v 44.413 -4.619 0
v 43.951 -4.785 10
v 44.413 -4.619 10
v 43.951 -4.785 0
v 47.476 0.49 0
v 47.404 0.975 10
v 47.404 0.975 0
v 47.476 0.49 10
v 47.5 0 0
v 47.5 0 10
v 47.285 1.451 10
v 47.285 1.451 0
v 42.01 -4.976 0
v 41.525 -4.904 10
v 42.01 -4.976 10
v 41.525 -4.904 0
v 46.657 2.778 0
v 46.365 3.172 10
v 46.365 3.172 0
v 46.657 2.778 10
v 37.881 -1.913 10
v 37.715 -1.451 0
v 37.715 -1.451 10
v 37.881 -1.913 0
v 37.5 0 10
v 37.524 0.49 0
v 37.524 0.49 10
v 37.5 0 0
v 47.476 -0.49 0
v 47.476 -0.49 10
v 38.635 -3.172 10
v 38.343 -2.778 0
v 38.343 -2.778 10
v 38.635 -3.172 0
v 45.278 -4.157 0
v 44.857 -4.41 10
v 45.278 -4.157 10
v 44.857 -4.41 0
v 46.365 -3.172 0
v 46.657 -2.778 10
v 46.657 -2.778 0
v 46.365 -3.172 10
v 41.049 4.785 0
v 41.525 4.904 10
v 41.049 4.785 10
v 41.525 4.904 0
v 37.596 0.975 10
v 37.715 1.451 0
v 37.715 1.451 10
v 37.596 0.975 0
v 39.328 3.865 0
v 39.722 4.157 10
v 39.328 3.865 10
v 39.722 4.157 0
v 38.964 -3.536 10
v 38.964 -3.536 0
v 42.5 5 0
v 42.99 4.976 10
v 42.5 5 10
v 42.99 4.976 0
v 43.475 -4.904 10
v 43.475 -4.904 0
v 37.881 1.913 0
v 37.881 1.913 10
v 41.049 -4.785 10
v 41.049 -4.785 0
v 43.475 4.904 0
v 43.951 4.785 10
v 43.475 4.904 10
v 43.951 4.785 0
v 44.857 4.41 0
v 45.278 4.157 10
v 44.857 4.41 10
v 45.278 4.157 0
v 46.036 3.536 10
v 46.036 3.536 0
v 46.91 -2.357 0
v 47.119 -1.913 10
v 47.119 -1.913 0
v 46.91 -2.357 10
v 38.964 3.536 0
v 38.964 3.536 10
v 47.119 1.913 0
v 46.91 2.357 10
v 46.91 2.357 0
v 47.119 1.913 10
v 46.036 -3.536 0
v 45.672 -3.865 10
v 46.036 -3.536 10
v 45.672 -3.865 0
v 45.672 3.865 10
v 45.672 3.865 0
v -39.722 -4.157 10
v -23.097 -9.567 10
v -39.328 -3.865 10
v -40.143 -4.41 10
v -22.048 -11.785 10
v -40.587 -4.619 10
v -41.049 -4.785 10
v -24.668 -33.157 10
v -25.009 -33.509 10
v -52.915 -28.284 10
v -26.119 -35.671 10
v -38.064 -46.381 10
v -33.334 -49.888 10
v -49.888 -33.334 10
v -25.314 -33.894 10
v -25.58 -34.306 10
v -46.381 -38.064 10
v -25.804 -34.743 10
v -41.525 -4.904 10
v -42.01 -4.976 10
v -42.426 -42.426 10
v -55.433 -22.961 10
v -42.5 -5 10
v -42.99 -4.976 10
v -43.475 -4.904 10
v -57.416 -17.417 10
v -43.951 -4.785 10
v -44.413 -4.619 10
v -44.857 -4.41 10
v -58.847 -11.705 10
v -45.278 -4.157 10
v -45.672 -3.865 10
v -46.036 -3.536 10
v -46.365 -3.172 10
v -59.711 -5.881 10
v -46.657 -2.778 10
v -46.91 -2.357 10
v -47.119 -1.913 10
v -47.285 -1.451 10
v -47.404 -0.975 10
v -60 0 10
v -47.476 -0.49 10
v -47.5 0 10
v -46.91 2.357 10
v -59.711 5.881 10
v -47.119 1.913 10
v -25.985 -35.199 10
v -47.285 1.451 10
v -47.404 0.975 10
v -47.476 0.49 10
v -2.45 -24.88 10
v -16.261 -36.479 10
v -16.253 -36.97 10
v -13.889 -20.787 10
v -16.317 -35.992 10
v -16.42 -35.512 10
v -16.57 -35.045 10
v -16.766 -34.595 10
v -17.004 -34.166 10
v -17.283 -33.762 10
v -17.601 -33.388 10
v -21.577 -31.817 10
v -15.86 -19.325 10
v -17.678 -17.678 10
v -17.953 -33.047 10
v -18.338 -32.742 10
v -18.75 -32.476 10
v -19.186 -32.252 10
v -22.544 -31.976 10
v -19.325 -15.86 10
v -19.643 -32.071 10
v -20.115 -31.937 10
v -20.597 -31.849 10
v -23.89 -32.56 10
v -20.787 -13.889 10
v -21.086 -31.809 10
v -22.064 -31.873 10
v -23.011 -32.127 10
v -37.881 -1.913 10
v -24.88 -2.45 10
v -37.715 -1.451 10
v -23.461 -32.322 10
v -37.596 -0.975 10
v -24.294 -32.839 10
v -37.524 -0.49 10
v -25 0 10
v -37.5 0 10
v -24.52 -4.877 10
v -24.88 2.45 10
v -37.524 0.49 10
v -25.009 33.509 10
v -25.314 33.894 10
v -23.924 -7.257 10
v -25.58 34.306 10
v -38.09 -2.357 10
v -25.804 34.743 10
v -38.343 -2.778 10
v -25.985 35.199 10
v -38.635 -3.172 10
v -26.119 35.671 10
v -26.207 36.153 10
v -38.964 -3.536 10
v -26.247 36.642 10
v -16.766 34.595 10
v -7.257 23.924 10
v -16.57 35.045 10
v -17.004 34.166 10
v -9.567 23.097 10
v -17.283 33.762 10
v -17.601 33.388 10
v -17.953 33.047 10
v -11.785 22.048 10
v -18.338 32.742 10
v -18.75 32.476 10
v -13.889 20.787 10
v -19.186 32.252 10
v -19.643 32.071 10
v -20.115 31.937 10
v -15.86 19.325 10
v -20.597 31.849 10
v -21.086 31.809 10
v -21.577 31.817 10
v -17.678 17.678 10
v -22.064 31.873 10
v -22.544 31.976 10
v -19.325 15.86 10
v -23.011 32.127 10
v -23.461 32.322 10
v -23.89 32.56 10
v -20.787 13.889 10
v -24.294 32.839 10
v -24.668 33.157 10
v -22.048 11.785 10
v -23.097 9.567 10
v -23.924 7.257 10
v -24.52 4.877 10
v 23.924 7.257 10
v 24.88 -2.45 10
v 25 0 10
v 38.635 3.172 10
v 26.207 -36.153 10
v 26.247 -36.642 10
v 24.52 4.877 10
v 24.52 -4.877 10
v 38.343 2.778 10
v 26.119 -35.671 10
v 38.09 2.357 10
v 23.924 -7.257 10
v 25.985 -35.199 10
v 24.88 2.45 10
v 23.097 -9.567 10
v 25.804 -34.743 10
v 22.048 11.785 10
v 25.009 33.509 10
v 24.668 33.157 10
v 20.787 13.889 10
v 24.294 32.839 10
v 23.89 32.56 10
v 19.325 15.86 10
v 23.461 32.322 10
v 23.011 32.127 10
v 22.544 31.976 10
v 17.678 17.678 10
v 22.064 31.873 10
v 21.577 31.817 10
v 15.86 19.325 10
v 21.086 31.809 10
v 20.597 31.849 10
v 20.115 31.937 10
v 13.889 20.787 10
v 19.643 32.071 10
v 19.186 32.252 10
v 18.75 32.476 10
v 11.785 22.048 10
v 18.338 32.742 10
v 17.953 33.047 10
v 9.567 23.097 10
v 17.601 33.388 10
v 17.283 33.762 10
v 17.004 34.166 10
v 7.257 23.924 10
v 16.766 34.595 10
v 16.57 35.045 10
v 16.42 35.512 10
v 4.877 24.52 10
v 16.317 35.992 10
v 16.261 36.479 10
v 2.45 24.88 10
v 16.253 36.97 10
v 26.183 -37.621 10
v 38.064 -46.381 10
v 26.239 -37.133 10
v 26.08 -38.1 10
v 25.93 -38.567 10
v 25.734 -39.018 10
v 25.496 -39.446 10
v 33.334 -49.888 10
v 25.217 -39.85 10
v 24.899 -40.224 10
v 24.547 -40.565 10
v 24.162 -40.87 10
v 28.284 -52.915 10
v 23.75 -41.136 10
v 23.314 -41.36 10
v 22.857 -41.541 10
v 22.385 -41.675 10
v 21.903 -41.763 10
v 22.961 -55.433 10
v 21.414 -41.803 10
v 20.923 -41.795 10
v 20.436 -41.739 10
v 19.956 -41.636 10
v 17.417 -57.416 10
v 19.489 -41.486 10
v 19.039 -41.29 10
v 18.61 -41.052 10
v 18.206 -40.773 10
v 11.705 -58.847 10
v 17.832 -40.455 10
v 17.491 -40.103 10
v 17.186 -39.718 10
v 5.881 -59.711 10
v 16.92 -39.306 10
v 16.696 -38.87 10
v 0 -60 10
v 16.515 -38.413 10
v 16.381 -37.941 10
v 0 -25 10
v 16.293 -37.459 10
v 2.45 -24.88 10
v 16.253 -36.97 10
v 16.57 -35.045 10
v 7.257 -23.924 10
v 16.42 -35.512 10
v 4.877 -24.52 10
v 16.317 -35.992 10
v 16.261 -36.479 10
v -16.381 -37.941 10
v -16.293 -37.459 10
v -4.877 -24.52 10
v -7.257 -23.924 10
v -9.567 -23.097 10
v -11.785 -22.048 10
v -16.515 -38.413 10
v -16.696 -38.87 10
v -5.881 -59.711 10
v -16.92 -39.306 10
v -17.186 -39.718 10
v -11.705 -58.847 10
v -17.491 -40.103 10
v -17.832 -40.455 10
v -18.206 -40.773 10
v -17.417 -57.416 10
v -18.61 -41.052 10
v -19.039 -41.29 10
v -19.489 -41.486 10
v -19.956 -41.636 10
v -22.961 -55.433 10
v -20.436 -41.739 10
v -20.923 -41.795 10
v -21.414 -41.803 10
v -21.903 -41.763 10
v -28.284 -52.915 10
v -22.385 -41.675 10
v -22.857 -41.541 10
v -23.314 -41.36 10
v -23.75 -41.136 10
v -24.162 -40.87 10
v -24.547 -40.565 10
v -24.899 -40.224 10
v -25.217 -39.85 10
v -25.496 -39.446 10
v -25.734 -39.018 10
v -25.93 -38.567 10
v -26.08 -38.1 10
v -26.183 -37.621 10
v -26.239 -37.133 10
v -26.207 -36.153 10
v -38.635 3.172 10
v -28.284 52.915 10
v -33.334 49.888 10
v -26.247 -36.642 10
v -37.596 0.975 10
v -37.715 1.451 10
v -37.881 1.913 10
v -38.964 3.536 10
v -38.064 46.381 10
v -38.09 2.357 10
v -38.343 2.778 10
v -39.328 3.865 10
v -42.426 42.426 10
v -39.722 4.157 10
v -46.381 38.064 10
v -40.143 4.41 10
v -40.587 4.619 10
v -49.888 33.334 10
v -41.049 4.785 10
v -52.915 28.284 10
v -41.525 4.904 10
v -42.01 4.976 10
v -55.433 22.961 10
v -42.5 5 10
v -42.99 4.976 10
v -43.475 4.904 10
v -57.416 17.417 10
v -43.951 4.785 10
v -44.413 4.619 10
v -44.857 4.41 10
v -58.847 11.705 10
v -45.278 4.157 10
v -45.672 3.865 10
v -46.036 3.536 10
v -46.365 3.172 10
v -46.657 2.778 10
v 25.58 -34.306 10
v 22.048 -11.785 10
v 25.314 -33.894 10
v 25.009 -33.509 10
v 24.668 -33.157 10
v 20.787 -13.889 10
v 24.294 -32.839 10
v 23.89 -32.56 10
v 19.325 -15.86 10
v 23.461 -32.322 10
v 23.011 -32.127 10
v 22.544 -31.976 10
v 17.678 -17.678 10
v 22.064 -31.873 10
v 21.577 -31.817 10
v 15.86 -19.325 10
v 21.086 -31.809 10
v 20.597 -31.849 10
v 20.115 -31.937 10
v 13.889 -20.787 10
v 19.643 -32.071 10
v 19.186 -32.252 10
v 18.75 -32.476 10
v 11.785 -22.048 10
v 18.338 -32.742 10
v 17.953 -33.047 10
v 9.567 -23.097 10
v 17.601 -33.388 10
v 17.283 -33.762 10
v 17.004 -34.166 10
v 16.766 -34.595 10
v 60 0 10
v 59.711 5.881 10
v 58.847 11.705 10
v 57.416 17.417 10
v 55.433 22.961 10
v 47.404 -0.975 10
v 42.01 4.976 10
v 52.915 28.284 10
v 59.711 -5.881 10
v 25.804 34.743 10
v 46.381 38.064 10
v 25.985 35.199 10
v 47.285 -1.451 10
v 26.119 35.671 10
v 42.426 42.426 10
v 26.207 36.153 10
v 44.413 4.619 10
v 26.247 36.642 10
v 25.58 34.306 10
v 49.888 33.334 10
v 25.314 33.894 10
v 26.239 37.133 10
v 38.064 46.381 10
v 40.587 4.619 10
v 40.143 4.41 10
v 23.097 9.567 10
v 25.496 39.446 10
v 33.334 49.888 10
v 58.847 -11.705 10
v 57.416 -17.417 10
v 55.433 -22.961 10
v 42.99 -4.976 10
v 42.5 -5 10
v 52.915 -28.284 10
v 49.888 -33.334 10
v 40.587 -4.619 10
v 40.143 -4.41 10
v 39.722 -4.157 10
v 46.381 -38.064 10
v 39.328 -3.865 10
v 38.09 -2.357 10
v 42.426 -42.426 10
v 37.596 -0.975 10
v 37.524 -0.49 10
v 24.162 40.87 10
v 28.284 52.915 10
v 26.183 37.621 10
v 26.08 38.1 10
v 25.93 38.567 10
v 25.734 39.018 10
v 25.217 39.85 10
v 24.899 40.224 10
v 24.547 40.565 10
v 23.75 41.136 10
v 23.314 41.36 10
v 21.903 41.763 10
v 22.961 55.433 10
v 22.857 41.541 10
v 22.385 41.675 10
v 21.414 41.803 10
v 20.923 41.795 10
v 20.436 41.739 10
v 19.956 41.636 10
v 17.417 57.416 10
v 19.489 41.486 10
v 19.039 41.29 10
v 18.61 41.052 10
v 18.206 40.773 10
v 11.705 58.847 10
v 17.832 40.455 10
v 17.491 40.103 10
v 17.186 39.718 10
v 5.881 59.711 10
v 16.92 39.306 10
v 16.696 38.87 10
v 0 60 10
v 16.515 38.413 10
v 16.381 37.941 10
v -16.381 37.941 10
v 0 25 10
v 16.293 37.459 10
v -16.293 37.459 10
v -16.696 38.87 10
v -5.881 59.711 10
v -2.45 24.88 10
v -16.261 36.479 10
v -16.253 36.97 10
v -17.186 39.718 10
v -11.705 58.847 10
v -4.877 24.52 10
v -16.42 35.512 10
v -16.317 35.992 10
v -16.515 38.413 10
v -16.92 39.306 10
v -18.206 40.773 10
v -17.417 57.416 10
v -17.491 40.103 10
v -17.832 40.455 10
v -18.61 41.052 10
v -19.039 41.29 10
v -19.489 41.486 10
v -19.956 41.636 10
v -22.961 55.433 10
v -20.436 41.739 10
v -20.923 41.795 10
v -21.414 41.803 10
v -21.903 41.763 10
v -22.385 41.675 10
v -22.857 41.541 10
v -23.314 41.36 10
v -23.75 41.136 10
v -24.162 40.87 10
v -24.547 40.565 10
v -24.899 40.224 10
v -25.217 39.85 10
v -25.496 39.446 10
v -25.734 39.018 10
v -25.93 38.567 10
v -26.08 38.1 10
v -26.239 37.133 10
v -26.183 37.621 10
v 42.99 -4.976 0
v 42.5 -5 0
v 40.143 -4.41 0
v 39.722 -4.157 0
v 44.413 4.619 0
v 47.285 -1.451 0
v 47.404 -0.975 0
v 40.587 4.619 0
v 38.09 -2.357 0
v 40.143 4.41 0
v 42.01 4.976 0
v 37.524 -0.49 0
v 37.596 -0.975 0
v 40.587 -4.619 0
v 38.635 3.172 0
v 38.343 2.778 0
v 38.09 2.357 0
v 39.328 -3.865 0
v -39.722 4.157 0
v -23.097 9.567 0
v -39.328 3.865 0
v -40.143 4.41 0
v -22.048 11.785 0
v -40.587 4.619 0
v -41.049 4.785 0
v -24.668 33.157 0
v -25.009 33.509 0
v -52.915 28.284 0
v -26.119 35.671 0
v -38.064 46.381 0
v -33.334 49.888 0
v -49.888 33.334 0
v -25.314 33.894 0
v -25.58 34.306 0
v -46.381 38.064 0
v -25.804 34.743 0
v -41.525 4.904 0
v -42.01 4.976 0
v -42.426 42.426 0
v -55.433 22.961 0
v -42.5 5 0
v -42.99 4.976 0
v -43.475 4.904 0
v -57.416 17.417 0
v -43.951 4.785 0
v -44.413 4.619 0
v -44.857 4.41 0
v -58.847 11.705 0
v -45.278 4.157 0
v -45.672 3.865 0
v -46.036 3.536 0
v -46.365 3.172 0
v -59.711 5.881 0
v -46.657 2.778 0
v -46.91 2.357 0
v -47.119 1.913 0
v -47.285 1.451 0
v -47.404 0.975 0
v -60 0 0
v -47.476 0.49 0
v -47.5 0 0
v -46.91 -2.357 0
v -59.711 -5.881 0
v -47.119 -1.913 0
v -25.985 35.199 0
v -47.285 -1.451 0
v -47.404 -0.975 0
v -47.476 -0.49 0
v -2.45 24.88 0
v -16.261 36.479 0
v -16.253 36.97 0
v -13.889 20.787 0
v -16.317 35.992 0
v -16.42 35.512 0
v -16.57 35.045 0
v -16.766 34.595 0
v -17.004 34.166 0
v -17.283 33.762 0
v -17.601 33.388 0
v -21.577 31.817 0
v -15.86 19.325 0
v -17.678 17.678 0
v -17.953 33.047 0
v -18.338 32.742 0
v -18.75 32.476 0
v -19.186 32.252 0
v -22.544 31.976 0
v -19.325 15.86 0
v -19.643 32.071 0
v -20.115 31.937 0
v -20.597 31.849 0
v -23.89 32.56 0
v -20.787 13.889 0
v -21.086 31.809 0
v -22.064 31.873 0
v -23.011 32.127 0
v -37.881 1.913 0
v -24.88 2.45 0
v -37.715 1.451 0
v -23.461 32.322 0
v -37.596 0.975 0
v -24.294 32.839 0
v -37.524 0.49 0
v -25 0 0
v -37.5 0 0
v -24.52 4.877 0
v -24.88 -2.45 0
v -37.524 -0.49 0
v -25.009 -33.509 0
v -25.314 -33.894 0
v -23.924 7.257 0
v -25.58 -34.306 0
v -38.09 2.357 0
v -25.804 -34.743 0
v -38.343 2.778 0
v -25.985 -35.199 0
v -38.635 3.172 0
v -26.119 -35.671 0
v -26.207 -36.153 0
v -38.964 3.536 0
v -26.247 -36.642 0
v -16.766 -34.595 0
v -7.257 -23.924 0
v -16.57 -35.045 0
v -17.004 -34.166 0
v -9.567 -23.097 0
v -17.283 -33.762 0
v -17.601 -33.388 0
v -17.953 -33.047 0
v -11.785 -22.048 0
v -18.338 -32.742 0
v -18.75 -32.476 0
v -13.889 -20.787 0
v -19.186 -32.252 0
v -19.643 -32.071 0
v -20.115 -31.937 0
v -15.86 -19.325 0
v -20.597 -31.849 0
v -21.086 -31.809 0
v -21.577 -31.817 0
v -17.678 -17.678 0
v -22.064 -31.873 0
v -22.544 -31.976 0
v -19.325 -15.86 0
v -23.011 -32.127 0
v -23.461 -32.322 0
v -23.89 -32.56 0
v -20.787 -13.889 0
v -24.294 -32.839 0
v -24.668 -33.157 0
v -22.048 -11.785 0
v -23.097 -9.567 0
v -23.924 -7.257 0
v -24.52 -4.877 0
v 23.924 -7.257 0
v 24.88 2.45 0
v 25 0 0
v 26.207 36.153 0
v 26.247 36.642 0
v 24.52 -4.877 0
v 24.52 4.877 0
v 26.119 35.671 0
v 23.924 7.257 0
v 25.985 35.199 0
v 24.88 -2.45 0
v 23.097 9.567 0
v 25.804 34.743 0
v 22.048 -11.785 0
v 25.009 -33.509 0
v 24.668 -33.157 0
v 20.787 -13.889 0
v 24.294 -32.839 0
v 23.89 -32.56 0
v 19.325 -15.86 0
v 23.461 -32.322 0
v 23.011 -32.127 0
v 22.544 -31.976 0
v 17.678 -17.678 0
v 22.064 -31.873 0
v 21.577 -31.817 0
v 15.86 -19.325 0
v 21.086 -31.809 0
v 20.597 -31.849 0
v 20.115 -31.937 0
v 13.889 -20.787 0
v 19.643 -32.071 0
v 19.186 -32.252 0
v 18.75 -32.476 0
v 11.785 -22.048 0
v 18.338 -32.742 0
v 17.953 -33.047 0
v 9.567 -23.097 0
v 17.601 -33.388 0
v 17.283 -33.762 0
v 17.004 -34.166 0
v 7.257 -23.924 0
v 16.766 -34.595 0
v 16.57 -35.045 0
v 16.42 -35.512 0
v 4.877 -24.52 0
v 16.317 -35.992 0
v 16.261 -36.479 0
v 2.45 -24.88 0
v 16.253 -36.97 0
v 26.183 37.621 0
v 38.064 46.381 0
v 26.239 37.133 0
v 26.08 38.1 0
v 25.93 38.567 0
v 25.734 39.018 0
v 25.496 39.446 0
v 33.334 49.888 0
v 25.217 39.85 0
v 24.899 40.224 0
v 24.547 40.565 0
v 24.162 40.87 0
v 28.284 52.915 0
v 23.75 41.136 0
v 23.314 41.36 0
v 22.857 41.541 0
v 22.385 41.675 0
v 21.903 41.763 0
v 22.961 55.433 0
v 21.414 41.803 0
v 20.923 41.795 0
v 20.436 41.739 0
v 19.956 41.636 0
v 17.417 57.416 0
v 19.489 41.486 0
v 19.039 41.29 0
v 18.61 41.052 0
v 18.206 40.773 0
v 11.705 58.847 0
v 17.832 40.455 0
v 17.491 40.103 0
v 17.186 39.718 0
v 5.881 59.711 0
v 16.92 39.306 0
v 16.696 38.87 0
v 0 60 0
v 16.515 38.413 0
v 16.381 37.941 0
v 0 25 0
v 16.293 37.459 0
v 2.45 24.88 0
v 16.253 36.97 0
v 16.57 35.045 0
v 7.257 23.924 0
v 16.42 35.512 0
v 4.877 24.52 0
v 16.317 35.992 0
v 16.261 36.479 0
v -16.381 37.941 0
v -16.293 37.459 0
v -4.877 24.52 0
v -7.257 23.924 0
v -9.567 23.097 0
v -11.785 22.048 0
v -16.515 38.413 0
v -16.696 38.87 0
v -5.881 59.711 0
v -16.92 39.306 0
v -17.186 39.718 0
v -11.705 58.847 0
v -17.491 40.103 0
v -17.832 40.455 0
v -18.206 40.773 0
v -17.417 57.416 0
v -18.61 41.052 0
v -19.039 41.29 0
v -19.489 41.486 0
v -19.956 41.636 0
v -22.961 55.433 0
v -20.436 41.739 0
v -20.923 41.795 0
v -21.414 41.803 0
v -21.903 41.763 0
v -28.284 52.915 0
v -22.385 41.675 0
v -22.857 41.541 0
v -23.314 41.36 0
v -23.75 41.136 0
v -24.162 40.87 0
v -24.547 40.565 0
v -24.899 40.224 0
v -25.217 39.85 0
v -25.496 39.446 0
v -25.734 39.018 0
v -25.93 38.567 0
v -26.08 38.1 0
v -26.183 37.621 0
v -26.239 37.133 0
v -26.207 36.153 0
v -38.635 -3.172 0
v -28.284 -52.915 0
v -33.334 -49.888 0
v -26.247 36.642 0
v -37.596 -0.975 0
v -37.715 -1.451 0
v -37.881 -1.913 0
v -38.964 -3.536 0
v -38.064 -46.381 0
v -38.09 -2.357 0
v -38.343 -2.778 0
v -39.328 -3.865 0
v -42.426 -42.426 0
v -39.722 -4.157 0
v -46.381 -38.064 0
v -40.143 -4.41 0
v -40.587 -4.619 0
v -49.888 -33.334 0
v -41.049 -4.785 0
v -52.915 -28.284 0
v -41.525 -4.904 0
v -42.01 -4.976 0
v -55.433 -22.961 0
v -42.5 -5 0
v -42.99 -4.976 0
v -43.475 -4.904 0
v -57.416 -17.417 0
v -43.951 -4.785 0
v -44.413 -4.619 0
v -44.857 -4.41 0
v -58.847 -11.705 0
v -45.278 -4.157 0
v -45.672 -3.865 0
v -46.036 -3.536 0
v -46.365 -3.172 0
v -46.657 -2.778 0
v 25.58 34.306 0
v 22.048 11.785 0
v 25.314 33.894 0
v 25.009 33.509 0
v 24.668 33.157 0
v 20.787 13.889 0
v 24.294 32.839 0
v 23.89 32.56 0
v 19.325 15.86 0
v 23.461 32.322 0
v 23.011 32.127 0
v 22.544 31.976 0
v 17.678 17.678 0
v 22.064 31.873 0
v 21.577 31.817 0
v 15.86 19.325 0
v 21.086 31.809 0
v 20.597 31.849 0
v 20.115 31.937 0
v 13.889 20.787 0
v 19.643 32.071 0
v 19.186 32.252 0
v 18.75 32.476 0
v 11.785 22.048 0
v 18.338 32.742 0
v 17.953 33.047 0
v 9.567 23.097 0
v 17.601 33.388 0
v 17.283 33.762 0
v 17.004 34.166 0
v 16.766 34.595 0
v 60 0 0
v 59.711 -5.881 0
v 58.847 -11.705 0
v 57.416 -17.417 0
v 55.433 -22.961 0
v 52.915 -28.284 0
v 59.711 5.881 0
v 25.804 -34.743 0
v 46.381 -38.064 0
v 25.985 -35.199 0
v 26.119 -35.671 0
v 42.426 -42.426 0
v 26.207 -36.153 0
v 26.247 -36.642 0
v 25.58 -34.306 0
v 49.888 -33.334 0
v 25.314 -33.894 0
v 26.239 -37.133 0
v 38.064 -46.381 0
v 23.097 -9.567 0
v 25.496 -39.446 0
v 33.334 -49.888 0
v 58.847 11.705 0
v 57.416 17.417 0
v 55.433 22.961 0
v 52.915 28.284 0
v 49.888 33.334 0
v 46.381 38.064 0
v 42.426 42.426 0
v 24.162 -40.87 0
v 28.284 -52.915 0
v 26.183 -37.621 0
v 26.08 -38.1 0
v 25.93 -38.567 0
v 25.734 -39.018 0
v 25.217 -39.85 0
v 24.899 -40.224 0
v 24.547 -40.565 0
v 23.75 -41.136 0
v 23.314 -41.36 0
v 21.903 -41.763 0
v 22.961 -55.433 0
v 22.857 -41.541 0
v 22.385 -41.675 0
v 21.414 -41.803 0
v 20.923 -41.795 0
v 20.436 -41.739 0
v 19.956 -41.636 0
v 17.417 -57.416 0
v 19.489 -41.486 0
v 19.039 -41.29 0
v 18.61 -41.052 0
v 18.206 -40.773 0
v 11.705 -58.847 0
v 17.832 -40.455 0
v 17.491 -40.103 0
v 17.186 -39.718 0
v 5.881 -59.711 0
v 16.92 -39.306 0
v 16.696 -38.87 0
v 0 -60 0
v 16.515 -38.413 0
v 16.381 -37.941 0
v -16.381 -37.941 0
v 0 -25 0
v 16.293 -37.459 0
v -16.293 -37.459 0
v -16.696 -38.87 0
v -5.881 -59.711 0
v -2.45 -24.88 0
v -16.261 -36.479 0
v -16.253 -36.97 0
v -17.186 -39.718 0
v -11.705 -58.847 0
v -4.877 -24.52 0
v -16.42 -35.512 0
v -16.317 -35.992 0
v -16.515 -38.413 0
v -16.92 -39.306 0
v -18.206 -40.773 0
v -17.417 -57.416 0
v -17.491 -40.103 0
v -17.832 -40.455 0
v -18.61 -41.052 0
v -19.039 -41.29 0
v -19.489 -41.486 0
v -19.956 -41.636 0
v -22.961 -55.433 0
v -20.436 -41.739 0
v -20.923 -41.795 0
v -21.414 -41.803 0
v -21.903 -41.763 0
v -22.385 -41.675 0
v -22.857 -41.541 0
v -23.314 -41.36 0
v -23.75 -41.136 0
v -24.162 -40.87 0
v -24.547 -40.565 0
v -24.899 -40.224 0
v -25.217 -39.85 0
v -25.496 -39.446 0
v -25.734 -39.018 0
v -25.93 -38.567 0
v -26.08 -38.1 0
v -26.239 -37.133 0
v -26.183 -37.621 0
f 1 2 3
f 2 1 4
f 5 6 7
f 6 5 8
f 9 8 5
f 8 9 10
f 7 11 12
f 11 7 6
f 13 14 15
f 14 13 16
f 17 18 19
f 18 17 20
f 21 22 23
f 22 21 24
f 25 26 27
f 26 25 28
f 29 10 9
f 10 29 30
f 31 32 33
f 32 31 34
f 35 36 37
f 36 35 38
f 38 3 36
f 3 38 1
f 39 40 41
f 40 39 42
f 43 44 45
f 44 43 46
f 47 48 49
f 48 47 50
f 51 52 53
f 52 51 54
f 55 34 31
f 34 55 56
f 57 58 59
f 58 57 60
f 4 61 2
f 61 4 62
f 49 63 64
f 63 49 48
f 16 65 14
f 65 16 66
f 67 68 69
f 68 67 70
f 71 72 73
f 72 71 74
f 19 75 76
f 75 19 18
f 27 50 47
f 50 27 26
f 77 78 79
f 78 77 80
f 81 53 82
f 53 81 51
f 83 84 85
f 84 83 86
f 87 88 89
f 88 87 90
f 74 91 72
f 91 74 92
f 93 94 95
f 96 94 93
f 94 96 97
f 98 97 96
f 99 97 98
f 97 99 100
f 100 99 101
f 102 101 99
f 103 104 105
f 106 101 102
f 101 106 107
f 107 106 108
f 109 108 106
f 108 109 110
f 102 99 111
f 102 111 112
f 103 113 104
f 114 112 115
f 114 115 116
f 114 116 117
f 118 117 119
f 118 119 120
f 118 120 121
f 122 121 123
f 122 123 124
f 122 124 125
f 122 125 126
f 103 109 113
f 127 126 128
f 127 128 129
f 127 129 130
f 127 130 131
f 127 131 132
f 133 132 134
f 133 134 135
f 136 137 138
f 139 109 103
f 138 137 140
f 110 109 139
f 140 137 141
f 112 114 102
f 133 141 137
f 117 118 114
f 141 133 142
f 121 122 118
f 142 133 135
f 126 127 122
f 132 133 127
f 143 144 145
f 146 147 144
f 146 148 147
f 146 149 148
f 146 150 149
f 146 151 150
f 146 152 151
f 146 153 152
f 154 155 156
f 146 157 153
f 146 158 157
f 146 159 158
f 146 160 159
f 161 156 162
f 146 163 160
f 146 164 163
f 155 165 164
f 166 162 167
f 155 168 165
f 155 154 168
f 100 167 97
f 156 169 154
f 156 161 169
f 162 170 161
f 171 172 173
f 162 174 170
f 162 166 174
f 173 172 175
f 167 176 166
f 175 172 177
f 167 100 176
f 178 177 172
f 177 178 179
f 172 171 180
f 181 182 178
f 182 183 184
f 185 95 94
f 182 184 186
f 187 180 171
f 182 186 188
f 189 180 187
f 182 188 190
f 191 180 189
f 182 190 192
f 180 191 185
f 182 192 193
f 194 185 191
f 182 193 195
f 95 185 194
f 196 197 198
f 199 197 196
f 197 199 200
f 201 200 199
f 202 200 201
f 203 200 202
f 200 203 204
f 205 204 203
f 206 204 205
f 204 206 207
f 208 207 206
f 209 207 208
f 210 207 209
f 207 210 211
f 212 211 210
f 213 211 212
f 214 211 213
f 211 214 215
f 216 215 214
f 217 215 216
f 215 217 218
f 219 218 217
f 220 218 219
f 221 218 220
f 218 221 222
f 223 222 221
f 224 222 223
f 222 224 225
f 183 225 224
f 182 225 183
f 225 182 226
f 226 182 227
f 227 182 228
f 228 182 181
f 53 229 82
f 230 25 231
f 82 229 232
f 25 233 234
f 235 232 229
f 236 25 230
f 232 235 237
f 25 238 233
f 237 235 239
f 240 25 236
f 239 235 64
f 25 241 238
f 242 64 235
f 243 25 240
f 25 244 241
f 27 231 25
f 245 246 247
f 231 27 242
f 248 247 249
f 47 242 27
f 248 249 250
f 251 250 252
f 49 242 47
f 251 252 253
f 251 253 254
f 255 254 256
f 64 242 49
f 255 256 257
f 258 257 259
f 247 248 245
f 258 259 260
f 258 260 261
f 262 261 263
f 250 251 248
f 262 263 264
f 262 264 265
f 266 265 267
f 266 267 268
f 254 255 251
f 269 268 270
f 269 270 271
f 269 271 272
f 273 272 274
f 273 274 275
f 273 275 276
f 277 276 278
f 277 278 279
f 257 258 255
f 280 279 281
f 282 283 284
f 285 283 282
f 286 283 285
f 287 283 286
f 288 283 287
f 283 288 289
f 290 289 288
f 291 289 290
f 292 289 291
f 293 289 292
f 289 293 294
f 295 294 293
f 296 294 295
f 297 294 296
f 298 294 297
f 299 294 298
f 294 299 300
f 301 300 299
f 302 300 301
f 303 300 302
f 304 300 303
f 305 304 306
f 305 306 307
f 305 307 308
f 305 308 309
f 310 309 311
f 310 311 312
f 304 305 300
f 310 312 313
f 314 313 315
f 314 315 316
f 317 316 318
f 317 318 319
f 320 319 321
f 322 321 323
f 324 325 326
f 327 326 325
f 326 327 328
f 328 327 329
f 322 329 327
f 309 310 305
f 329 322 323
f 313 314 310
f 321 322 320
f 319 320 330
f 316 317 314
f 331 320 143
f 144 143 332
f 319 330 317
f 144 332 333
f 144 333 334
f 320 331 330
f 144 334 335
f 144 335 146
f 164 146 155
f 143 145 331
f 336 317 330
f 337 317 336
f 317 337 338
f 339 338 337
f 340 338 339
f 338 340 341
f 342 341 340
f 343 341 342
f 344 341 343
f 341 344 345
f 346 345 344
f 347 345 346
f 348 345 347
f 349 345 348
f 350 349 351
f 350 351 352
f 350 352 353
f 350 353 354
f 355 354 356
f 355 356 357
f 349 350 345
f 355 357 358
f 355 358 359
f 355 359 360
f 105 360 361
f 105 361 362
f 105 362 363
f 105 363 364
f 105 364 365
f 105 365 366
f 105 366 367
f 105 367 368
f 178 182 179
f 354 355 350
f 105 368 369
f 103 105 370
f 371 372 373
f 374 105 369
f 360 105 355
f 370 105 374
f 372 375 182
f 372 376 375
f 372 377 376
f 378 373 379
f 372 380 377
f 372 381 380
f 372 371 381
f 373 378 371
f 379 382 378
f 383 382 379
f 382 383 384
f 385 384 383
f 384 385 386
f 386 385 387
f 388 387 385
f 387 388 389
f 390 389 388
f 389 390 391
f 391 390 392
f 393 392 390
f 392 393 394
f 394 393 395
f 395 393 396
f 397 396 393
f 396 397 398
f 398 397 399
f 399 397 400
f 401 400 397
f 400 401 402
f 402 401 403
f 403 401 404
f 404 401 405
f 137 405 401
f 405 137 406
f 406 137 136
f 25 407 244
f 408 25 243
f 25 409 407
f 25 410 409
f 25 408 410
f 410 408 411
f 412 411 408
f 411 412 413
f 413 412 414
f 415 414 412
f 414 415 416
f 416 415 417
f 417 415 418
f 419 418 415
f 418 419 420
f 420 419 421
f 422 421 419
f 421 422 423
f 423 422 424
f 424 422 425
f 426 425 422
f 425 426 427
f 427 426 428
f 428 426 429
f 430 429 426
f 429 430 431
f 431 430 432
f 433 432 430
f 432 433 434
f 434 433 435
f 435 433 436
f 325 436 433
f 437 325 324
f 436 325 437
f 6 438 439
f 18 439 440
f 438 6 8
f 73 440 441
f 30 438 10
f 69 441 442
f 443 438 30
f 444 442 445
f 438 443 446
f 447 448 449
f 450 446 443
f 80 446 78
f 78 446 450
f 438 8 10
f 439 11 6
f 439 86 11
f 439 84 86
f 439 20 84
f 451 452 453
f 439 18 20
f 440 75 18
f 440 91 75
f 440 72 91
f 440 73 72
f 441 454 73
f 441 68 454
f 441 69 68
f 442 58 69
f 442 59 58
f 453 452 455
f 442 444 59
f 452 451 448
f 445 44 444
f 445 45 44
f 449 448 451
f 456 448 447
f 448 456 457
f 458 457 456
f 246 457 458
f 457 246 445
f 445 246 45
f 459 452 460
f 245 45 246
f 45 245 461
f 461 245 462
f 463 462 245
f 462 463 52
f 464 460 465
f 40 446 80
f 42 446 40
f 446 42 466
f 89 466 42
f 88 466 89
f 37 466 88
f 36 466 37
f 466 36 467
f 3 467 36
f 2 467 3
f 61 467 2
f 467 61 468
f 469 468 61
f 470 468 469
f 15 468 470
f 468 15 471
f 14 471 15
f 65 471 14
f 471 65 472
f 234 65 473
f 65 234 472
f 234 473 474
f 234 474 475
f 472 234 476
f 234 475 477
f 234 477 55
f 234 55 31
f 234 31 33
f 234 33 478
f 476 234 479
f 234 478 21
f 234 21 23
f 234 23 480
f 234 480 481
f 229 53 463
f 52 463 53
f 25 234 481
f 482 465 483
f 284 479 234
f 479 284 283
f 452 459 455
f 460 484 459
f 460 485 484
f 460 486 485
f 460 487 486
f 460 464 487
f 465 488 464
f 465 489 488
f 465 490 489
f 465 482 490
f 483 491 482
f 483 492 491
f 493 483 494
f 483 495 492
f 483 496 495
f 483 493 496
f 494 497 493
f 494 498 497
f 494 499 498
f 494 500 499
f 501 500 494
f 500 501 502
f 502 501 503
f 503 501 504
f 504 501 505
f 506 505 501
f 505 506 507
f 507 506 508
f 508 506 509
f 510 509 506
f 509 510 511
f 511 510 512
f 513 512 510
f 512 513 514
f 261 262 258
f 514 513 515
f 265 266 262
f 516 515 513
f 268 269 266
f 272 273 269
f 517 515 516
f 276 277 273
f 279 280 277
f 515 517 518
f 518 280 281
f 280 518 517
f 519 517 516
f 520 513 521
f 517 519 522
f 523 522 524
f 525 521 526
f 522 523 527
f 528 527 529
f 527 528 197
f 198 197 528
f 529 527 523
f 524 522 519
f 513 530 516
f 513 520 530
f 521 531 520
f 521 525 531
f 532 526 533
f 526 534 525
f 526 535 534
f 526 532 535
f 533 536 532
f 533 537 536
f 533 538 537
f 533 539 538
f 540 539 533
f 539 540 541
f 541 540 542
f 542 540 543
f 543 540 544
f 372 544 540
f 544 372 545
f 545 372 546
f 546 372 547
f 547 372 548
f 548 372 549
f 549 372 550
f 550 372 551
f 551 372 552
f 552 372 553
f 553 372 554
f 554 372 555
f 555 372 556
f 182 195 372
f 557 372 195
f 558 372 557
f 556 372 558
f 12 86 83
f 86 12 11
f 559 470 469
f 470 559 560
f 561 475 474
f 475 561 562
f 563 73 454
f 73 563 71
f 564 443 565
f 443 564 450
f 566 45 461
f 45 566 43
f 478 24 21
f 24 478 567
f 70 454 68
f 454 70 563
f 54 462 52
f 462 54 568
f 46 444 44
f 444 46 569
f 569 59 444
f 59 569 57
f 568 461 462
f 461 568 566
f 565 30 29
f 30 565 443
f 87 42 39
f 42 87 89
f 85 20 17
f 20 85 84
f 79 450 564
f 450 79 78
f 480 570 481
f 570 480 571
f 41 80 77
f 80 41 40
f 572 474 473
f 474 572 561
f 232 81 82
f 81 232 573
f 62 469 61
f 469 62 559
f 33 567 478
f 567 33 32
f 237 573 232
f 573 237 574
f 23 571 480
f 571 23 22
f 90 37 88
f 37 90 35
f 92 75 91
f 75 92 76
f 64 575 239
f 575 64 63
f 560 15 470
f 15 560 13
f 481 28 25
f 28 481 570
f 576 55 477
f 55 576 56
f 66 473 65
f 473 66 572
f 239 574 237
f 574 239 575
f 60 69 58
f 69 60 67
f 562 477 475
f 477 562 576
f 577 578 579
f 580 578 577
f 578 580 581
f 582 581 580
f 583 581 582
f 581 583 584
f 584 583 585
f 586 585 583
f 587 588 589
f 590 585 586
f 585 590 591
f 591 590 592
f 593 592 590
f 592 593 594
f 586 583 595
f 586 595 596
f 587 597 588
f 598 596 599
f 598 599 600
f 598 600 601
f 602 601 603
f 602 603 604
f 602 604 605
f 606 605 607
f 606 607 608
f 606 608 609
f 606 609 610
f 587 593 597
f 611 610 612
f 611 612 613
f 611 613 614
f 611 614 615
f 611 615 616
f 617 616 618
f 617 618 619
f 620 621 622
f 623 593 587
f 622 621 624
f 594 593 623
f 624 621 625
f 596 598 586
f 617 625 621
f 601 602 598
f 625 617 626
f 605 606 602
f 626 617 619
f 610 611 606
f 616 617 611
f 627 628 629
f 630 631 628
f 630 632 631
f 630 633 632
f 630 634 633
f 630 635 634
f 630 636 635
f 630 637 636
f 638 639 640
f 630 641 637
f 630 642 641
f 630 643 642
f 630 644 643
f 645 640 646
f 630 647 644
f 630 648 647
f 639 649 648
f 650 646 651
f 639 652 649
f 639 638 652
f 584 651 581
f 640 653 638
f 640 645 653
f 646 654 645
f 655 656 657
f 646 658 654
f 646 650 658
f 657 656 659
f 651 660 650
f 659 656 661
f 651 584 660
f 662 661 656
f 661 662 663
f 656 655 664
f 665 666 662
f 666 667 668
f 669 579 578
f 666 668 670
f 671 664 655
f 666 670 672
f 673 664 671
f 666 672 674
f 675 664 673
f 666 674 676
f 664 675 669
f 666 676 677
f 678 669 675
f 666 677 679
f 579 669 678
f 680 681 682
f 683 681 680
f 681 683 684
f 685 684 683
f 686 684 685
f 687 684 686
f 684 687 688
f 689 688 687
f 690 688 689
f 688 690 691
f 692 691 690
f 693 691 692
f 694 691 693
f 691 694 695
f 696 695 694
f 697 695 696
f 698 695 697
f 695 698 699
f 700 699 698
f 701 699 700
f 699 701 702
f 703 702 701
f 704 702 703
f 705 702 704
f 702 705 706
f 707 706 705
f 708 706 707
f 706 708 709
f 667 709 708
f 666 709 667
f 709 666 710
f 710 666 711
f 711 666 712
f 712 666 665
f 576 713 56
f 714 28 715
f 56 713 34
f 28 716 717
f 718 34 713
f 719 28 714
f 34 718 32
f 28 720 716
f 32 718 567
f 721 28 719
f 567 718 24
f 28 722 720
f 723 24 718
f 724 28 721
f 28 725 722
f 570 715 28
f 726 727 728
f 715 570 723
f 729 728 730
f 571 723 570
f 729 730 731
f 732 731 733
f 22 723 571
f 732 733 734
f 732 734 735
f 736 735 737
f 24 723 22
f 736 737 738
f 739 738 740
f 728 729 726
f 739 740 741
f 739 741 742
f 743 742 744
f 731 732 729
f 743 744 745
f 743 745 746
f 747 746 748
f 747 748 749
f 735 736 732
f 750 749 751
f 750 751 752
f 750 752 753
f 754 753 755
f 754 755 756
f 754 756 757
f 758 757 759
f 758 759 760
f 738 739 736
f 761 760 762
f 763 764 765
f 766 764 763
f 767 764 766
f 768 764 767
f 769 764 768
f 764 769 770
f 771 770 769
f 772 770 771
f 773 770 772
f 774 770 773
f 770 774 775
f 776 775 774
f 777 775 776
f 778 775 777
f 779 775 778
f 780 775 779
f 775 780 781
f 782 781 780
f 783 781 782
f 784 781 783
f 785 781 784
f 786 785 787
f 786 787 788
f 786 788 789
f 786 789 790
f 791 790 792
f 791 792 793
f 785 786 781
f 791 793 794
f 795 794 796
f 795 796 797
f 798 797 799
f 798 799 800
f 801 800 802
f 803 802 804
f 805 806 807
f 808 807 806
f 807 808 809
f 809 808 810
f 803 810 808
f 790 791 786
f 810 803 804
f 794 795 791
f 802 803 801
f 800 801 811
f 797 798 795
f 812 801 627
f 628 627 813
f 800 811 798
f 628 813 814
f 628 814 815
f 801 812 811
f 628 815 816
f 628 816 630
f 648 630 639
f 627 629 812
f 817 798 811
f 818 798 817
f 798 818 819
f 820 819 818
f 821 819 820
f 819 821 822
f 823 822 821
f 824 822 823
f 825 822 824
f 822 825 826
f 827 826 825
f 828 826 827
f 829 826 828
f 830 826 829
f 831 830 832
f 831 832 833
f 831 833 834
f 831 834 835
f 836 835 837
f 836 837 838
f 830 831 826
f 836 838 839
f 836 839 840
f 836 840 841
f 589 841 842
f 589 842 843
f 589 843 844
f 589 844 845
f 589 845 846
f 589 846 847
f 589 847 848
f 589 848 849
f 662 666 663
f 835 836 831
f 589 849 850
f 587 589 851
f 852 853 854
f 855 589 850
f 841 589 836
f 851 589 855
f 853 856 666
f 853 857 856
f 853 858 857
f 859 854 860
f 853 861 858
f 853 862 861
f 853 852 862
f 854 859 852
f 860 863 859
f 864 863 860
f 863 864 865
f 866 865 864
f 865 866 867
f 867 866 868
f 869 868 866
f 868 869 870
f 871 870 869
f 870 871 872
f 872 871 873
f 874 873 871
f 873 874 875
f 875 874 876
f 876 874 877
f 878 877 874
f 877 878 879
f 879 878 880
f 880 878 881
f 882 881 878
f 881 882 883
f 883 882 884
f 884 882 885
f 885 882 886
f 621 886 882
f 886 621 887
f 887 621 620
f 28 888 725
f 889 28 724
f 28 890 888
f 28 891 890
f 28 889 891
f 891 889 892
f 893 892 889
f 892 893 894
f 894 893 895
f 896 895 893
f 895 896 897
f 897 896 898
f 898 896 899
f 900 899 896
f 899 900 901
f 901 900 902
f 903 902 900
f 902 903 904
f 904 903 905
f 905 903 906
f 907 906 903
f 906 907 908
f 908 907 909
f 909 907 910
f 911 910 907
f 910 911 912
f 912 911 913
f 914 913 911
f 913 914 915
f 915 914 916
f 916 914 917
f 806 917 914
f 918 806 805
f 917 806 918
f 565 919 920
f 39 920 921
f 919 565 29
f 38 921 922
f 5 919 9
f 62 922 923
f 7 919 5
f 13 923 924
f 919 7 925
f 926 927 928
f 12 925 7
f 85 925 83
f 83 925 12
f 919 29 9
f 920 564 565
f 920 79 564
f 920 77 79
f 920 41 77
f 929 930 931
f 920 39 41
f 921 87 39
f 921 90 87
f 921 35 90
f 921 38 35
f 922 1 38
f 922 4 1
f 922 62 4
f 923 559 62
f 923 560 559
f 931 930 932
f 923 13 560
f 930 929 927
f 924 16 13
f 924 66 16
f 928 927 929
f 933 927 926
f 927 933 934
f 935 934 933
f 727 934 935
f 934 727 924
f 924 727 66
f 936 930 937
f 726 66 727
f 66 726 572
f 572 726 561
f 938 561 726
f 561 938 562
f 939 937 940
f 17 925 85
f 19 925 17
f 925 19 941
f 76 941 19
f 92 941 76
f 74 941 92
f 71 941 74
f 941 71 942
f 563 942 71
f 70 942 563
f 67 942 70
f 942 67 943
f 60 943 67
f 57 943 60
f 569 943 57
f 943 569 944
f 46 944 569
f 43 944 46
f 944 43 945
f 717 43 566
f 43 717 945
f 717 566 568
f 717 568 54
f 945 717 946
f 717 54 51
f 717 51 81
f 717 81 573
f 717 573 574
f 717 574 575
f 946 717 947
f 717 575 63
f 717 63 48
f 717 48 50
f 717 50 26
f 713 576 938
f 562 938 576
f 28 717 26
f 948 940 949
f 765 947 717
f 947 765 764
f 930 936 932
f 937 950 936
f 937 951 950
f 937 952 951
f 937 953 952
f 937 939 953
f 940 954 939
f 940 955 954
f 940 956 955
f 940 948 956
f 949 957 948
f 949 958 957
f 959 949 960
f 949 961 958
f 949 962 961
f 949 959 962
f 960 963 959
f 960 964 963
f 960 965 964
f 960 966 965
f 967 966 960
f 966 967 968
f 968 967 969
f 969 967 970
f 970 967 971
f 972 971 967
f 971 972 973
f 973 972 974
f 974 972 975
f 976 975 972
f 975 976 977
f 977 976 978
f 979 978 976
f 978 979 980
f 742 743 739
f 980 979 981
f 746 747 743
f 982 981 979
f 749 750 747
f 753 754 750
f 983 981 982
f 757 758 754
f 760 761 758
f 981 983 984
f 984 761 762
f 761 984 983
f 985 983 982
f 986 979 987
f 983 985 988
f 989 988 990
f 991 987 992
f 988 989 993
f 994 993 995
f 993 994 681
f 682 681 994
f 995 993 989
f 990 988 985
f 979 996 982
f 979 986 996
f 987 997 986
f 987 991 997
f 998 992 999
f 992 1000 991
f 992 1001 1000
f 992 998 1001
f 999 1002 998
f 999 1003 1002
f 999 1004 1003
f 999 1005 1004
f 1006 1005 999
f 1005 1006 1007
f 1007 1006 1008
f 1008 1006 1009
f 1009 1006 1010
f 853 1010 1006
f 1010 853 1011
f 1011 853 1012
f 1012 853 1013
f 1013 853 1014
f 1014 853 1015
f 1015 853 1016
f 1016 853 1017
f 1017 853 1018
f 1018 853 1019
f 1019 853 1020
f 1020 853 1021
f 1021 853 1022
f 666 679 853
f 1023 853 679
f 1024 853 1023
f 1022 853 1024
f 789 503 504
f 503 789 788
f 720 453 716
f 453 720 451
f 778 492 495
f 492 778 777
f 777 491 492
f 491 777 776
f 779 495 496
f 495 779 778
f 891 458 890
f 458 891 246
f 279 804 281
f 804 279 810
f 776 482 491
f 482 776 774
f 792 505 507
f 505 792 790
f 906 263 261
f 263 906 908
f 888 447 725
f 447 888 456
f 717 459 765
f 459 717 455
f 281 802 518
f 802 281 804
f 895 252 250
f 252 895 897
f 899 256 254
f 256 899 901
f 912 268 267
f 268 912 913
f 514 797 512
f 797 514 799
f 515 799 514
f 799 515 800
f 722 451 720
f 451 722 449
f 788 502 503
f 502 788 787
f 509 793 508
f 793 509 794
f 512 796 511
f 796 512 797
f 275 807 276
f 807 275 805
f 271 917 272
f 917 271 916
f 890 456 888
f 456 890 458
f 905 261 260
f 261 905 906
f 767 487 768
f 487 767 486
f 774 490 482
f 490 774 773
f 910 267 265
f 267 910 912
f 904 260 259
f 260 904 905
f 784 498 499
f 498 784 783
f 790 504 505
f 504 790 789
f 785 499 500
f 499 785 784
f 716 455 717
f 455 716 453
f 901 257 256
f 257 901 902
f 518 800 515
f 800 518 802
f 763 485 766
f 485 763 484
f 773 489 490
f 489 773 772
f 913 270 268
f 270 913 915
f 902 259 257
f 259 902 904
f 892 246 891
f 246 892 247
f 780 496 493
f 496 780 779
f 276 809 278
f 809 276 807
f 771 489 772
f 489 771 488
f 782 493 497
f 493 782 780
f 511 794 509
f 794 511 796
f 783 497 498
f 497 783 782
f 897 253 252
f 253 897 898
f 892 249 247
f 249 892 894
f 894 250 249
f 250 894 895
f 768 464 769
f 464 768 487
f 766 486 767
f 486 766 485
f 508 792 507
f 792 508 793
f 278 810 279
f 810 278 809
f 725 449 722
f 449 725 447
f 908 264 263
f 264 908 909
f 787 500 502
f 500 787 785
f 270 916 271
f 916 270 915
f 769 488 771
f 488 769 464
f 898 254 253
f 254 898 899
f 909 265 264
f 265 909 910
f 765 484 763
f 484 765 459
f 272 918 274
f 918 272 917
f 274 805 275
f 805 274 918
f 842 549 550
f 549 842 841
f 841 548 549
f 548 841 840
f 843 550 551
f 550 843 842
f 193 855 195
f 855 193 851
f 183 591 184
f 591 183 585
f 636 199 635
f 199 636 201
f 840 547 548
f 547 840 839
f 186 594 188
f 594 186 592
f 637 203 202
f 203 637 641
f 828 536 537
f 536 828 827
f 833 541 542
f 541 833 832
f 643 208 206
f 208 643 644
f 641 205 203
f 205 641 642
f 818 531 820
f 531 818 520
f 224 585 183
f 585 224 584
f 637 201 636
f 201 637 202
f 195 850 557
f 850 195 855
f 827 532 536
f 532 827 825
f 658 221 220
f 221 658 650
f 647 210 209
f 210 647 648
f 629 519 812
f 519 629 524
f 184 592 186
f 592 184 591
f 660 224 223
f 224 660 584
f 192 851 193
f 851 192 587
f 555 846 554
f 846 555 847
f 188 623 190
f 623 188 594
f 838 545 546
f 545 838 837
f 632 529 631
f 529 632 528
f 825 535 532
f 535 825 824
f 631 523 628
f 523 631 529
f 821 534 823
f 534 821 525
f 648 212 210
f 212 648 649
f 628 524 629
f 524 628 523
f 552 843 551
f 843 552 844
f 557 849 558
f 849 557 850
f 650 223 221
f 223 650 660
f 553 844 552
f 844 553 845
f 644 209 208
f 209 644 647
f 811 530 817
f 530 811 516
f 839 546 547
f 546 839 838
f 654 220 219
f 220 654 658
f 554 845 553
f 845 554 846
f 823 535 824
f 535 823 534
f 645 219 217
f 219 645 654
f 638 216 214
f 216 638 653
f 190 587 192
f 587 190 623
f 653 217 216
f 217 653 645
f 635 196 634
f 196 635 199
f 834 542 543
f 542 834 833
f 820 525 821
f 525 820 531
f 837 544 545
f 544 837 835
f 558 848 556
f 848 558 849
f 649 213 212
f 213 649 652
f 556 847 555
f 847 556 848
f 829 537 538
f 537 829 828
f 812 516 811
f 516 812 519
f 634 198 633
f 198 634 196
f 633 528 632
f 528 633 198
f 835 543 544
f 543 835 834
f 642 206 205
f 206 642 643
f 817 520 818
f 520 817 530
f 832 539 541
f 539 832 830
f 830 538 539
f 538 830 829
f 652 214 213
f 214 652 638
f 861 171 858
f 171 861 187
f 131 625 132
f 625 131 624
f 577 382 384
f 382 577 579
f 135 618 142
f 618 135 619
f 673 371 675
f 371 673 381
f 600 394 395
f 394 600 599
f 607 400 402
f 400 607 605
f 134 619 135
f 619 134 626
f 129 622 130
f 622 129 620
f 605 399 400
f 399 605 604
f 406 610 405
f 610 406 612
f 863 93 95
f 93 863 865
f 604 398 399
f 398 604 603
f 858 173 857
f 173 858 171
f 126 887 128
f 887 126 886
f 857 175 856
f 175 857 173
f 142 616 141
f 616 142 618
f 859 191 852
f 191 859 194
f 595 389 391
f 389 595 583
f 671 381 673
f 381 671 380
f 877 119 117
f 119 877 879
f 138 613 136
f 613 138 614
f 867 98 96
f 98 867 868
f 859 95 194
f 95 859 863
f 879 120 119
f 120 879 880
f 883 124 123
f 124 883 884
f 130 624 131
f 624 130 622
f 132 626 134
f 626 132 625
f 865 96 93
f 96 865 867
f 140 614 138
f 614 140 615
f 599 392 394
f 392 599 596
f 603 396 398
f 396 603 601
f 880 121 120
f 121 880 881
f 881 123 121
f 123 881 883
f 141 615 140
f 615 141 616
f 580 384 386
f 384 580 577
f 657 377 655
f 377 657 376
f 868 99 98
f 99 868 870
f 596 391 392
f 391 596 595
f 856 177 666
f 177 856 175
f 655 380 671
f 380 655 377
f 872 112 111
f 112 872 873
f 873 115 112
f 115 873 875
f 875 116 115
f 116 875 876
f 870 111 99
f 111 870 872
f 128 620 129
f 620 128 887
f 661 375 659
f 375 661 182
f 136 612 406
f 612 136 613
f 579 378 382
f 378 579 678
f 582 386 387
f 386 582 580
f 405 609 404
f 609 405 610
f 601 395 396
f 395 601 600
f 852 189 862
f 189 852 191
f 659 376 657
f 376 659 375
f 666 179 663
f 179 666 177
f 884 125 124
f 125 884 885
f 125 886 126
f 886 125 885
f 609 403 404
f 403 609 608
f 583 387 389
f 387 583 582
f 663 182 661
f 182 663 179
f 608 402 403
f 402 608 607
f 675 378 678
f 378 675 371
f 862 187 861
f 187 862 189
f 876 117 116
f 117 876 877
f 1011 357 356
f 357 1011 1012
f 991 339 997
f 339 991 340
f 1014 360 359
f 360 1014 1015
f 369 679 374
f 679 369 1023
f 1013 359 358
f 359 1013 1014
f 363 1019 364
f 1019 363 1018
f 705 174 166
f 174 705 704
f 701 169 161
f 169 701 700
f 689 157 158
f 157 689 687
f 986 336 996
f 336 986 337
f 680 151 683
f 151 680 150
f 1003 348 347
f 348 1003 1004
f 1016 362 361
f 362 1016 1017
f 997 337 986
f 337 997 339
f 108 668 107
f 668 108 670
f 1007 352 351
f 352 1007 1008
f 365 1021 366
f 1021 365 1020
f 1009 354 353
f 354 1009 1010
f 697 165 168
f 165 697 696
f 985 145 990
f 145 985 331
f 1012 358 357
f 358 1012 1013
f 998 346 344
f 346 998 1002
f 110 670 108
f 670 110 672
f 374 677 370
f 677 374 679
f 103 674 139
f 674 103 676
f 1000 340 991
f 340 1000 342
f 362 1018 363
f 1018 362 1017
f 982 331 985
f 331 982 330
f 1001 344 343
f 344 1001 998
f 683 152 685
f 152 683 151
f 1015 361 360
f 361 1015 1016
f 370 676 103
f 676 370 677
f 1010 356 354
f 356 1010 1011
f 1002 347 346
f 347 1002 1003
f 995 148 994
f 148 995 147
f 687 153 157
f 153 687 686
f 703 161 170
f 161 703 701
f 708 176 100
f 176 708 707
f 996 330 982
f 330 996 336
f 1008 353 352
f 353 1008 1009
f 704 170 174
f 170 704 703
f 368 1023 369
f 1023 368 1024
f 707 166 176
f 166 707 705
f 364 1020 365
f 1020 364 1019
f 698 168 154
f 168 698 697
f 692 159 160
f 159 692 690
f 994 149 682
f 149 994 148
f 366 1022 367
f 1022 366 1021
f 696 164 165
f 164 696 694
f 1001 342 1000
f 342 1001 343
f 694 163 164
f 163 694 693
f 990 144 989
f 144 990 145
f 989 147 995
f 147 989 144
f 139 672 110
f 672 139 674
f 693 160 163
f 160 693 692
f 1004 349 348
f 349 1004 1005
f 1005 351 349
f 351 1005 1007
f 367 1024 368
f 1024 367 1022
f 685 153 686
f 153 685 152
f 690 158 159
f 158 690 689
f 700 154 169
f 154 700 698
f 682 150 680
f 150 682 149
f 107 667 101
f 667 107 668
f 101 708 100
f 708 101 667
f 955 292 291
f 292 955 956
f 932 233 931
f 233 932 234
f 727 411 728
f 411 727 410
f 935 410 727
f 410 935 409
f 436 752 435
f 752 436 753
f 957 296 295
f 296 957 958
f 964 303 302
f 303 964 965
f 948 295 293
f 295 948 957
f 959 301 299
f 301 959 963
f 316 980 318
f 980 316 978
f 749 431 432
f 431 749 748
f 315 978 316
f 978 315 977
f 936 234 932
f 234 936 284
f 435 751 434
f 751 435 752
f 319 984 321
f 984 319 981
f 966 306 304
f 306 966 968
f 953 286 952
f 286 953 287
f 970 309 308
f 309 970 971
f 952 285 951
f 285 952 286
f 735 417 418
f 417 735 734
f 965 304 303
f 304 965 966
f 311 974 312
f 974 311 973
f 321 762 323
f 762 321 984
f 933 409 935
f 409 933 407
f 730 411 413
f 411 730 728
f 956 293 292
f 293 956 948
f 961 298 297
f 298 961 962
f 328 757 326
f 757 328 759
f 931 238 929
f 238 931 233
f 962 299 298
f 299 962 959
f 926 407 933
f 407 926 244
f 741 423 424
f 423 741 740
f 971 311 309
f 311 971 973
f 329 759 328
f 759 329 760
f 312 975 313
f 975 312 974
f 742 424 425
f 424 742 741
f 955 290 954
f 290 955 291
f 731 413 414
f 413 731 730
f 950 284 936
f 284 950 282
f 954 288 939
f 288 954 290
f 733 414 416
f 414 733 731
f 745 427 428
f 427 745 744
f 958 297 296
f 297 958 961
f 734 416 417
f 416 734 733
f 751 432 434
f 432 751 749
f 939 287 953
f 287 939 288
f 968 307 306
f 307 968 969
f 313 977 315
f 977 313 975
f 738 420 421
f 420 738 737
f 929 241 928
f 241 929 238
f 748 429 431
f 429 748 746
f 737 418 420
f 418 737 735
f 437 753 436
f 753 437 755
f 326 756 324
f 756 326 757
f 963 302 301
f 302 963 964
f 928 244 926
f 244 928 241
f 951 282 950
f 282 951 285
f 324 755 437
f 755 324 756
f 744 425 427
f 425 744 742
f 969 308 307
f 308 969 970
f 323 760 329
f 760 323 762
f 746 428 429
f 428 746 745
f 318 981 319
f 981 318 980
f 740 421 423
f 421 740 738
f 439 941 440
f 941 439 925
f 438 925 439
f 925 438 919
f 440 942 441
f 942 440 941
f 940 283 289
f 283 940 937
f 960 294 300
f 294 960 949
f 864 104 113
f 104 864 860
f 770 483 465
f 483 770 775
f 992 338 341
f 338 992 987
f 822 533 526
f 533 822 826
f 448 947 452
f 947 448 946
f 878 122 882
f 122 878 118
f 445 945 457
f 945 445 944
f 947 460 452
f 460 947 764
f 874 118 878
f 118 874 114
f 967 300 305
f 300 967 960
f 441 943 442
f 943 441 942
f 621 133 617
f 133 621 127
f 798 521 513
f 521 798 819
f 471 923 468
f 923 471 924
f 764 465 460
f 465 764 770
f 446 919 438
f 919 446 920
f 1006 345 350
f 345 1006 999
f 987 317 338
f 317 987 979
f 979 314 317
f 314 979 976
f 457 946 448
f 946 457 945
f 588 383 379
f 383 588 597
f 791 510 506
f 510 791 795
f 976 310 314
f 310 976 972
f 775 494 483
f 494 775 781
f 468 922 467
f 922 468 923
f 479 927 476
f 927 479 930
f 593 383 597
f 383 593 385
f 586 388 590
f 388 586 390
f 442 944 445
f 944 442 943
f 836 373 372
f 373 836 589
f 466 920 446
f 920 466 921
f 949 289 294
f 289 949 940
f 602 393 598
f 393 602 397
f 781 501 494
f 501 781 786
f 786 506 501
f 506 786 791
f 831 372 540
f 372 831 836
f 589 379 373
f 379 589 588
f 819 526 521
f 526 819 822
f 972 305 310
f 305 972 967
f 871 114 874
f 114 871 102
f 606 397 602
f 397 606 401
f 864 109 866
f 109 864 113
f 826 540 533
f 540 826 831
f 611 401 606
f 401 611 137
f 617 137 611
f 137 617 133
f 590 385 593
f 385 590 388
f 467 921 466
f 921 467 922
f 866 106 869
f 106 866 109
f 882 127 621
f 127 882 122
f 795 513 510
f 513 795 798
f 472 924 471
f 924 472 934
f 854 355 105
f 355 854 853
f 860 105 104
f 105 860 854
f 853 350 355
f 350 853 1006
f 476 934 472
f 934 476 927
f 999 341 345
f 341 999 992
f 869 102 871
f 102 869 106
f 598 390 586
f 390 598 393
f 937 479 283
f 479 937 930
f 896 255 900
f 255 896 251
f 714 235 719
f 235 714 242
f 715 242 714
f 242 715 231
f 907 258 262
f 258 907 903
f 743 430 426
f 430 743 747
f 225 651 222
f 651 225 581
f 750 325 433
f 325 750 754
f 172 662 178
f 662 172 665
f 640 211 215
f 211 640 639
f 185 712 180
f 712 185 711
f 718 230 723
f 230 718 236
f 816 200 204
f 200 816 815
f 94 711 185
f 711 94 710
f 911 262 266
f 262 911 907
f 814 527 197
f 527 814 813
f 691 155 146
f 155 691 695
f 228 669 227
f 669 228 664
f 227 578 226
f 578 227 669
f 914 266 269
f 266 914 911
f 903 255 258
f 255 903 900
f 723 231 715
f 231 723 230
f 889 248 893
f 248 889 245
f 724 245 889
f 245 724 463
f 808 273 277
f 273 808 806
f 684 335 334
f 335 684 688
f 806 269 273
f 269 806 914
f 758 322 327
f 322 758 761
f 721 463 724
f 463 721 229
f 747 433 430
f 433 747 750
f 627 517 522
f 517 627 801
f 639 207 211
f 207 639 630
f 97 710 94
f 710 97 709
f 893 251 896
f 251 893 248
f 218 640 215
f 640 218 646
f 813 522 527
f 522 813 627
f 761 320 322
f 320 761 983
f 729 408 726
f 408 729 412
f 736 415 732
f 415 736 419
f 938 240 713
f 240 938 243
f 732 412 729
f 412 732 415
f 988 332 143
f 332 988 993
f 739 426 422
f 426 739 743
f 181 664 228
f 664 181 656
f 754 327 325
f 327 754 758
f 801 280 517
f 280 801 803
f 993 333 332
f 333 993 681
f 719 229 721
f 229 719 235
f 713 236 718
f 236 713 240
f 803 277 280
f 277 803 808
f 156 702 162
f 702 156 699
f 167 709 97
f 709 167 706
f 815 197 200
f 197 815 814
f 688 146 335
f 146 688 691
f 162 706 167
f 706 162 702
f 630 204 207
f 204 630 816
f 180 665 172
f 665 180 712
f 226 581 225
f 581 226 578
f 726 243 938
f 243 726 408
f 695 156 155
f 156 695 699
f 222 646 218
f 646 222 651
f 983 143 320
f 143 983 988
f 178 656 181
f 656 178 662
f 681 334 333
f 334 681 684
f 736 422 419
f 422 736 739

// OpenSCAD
// Generated by Text-to-CAD from prompt:
// a 6 bolt flange 120 mm diameter
$fn = 64;

module Flange() {
difference() {
    cylinder(h=10, r=60, $fn=$fn);
    cylinder(h=10, r=25, $fn=$fn);
    for (i = [0 : 5]) rotate([0, 0, 360.0 / 6 * i]) {
        translate([42.5, 0, 0]) {
            cylinder(h=10, r=5, $fn=$fn);
        }
    }
}
}

Flange();
